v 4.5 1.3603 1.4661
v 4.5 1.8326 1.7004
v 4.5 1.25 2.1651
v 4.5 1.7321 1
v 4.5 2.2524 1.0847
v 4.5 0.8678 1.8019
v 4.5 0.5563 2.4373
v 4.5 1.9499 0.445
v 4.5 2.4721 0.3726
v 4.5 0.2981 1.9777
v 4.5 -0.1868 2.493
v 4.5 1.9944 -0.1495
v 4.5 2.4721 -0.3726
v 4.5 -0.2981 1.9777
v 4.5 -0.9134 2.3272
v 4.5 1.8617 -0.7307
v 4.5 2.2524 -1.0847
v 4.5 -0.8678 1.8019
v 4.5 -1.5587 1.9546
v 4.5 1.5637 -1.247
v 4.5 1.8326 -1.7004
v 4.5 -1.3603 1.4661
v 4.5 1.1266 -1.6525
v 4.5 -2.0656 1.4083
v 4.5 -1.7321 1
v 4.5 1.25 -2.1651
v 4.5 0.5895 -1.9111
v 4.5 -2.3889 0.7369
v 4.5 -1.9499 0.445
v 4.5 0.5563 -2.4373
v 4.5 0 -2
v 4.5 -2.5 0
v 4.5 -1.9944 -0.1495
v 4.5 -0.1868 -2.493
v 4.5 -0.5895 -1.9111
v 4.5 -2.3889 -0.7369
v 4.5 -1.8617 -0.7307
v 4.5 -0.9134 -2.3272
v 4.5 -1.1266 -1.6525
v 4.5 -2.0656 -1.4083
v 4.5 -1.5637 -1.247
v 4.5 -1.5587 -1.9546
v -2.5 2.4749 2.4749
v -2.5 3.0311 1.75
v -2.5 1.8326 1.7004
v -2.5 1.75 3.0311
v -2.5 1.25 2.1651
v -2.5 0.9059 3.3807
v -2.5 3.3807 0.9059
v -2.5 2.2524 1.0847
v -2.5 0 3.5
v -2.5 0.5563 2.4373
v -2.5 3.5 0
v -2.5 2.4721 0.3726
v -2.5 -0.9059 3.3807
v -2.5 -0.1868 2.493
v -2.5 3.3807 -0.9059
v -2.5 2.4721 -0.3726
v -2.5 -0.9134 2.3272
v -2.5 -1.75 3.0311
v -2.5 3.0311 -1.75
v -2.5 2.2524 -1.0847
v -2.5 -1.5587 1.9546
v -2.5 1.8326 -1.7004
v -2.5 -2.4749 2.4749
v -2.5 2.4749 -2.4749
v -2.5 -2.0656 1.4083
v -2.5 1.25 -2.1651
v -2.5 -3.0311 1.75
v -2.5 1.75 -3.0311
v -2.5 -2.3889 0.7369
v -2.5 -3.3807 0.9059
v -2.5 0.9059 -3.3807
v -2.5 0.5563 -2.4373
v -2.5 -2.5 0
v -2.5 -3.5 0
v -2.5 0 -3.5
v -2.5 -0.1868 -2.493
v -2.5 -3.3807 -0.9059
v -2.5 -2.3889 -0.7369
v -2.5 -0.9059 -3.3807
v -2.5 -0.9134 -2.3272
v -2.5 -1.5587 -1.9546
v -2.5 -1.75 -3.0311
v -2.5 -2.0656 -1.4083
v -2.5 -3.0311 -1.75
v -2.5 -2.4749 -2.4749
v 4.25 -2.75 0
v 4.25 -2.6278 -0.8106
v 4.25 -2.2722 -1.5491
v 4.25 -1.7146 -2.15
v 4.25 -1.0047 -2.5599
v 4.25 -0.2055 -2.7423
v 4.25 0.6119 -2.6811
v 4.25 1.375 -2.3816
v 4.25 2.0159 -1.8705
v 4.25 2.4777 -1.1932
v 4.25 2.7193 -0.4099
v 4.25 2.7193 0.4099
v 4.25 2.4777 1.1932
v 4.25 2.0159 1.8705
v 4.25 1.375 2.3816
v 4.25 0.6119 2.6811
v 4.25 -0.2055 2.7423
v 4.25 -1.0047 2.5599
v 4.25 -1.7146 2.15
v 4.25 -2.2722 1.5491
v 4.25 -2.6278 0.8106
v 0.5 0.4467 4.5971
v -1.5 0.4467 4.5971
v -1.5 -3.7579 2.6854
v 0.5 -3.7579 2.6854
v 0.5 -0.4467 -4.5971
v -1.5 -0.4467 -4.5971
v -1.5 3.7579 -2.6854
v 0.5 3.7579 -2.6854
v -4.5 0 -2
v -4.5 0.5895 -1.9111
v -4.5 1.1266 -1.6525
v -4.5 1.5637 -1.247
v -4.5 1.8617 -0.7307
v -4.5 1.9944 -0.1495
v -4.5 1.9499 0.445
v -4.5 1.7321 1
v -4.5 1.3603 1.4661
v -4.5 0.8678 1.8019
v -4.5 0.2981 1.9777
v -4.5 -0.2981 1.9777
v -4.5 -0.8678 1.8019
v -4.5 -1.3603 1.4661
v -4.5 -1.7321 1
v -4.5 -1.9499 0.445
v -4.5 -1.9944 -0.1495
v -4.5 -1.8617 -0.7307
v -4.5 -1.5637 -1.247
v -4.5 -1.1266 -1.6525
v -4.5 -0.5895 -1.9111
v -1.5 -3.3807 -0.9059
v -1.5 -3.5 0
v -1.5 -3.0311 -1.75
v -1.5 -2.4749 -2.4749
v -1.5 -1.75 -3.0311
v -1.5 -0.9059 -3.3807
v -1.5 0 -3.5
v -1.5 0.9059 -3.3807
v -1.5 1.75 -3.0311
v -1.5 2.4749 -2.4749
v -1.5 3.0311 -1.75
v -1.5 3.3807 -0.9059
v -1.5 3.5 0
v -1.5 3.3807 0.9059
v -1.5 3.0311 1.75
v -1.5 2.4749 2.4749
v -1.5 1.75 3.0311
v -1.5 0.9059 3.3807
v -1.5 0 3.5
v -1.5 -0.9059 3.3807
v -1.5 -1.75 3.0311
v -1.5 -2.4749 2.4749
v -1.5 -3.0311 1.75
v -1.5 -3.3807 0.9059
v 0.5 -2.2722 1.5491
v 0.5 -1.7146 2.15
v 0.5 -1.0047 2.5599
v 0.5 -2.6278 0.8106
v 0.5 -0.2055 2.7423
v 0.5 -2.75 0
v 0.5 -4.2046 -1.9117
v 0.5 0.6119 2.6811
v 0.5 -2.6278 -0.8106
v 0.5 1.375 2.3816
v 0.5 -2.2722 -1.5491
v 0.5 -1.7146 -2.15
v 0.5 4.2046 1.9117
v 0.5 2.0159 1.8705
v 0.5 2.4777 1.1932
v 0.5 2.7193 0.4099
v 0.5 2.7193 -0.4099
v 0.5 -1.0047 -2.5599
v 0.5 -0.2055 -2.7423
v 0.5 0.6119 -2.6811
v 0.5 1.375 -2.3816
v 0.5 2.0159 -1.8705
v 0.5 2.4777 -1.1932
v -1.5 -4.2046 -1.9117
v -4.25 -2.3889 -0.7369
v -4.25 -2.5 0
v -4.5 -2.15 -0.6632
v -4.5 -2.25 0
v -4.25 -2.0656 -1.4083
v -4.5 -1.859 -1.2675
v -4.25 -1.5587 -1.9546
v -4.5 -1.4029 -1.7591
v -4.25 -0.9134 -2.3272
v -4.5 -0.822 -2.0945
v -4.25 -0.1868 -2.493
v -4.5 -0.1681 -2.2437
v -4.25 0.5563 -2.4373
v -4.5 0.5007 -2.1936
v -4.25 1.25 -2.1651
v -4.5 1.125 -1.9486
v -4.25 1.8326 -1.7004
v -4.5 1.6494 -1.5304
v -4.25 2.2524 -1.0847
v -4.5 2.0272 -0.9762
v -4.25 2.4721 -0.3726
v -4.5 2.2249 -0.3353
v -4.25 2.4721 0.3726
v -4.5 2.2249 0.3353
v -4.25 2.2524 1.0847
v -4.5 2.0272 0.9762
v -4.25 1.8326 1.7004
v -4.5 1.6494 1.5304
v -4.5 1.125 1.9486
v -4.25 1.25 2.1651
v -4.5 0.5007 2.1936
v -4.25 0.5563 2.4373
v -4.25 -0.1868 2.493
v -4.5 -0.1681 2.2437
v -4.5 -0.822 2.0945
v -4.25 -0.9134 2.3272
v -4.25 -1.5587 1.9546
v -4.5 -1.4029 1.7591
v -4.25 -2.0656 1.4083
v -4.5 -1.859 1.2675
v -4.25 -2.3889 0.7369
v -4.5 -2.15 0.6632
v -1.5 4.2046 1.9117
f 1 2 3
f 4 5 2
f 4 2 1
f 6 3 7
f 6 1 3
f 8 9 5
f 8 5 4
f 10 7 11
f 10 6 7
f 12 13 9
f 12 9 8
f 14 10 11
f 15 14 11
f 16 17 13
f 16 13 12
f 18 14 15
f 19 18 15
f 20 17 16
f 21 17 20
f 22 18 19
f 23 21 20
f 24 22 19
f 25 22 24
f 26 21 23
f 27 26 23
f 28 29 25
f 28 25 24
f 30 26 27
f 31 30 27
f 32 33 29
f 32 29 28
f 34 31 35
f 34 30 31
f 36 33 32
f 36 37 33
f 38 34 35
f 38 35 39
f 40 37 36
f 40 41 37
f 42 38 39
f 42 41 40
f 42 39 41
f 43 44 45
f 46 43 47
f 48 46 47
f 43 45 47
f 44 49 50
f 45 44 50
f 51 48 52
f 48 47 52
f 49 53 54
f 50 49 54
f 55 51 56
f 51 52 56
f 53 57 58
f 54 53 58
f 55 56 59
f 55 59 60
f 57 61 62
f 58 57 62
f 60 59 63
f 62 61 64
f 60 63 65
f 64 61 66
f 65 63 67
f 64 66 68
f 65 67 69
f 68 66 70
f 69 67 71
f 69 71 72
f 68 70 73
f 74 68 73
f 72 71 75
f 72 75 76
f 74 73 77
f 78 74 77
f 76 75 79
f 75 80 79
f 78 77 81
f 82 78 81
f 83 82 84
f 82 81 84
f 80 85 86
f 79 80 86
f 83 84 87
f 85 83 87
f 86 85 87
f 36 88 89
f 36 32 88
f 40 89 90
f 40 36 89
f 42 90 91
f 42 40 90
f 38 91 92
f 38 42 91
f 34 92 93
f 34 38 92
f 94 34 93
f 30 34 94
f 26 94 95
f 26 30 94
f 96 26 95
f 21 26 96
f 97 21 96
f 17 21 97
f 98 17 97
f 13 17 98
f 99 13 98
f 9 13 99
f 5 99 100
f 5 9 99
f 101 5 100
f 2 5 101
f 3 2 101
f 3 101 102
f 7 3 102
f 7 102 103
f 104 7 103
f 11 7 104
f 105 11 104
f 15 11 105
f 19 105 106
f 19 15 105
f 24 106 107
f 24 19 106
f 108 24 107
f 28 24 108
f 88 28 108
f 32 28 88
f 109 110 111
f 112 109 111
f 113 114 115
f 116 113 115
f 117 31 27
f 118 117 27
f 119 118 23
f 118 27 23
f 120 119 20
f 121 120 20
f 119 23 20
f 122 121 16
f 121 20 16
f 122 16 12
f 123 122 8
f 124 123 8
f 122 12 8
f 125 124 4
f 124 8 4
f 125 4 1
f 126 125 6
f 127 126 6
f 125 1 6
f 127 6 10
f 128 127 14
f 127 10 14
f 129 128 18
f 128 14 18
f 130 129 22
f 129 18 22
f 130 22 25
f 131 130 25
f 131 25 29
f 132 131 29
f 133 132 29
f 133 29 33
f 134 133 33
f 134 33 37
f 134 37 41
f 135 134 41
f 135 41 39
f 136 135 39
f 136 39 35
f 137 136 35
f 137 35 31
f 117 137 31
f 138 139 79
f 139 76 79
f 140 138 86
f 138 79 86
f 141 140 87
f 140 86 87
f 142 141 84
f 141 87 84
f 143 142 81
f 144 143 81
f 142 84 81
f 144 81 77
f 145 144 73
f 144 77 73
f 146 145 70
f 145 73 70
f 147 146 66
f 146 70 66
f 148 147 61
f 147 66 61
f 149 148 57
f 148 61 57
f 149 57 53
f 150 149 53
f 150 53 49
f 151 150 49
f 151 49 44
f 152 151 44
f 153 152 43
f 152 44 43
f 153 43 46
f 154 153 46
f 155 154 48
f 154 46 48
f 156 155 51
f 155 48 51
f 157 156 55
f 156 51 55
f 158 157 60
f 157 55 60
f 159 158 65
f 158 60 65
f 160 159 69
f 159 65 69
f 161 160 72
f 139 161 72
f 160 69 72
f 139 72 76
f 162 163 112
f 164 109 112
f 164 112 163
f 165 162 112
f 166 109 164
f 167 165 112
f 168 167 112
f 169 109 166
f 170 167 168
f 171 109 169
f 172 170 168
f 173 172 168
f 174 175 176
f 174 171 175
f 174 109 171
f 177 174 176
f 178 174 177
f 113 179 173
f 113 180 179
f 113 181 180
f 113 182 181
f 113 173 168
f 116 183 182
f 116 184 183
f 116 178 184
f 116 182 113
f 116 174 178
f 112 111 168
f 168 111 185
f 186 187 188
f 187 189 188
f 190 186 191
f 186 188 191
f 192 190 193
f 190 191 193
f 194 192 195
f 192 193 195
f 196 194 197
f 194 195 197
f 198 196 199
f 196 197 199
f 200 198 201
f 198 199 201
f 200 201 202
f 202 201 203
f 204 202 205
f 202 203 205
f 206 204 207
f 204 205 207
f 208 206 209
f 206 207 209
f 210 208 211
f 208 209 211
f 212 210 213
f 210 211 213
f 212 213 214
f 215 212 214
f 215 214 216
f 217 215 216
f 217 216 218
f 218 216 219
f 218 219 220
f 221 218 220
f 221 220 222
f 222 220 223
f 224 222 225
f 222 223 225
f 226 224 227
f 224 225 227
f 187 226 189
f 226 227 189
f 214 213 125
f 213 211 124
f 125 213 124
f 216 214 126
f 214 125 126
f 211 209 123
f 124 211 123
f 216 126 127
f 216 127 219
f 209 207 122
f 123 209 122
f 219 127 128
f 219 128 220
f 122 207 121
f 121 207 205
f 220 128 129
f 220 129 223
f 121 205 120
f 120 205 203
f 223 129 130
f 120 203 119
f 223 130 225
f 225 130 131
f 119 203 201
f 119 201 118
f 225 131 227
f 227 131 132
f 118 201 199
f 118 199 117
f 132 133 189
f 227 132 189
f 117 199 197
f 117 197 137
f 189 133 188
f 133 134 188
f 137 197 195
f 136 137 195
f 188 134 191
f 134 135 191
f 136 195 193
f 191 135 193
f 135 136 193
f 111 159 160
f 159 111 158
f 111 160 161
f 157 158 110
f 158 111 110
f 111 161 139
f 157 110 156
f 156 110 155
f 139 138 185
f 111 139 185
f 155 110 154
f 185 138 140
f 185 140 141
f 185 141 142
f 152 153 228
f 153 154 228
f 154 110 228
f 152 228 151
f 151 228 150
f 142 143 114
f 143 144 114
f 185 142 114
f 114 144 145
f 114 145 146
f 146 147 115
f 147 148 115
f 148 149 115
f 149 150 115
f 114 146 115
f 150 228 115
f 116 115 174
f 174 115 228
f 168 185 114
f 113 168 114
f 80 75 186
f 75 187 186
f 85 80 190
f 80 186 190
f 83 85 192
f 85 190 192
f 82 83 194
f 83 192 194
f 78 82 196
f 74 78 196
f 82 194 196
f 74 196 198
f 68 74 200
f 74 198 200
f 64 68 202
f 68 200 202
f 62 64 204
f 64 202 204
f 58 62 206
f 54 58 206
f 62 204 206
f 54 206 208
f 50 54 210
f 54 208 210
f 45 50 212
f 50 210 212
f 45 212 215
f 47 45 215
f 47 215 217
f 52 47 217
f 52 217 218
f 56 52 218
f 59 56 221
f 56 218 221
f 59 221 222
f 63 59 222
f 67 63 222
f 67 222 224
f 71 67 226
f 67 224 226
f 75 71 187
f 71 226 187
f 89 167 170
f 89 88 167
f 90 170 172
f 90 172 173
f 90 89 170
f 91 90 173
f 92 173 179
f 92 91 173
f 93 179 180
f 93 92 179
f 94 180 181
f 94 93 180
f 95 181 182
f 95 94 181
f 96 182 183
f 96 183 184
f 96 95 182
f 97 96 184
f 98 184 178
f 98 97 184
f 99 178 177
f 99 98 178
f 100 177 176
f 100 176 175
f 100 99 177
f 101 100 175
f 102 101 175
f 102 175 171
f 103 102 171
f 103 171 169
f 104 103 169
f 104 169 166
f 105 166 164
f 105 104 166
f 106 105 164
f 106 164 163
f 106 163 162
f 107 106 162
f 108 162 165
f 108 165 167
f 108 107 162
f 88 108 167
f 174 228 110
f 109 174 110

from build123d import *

# Parameters (mm, degrees)
BOSS_EXTRUDE2_DEPTH = 2
SKETCH9_R           = 2
CUT_EXTRUDE1_DEPTH  = 10


with BuildPart() as part:
    # Sketch1 → Revolve1 (revolve)
    with BuildSketch(Plane.XY):
        Polygon((-4.5, 0), (-1.5, 0), (-1.5, -3.5), (-2.5, -3.5), (-2.5, -2.5), (-4.25, -2.5), (-4.5, -2.25), align=None)
        Polygon((0.5, -2.75), (4.25, -2.75), (4.5, -2.5), (4.5, 0), (0.5, 0), align=None)
    revolve(axis=Axis((-4.5, 0, 0), (1, 0, 0)))

    # Sketch5 → Boss-Extrude2 (add)
    with BuildSketch(Plane(origin=(-1.5, 0, 0), x_dir=(0, 0, -1), z_dir=(1, 0, 0))):
        Polygon((1.911716384, -4.204601503), (4.597149907, -0.446705798), (2.685433523, 3.757895705), (-1.911716384, 4.204601503), (-4.597149907, 0.446705798), (-2.685433523, -3.757895705), align=None)
    extrude(amount=BOSS_EXTRUDE2_DEPTH)

    # Sketch9 → Cut-Extrude1 (cut)
    with BuildSketch(Plane(origin=(4.5, 0, 0), x_dir=(0, 0, -1), z_dir=(1, 0, 0))):
        Circle(SKETCH9_R)
    extrude(amount=-CUT_EXTRUDE1_DEPTH, mode=Mode.SUBTRACT)


solid = part.part
